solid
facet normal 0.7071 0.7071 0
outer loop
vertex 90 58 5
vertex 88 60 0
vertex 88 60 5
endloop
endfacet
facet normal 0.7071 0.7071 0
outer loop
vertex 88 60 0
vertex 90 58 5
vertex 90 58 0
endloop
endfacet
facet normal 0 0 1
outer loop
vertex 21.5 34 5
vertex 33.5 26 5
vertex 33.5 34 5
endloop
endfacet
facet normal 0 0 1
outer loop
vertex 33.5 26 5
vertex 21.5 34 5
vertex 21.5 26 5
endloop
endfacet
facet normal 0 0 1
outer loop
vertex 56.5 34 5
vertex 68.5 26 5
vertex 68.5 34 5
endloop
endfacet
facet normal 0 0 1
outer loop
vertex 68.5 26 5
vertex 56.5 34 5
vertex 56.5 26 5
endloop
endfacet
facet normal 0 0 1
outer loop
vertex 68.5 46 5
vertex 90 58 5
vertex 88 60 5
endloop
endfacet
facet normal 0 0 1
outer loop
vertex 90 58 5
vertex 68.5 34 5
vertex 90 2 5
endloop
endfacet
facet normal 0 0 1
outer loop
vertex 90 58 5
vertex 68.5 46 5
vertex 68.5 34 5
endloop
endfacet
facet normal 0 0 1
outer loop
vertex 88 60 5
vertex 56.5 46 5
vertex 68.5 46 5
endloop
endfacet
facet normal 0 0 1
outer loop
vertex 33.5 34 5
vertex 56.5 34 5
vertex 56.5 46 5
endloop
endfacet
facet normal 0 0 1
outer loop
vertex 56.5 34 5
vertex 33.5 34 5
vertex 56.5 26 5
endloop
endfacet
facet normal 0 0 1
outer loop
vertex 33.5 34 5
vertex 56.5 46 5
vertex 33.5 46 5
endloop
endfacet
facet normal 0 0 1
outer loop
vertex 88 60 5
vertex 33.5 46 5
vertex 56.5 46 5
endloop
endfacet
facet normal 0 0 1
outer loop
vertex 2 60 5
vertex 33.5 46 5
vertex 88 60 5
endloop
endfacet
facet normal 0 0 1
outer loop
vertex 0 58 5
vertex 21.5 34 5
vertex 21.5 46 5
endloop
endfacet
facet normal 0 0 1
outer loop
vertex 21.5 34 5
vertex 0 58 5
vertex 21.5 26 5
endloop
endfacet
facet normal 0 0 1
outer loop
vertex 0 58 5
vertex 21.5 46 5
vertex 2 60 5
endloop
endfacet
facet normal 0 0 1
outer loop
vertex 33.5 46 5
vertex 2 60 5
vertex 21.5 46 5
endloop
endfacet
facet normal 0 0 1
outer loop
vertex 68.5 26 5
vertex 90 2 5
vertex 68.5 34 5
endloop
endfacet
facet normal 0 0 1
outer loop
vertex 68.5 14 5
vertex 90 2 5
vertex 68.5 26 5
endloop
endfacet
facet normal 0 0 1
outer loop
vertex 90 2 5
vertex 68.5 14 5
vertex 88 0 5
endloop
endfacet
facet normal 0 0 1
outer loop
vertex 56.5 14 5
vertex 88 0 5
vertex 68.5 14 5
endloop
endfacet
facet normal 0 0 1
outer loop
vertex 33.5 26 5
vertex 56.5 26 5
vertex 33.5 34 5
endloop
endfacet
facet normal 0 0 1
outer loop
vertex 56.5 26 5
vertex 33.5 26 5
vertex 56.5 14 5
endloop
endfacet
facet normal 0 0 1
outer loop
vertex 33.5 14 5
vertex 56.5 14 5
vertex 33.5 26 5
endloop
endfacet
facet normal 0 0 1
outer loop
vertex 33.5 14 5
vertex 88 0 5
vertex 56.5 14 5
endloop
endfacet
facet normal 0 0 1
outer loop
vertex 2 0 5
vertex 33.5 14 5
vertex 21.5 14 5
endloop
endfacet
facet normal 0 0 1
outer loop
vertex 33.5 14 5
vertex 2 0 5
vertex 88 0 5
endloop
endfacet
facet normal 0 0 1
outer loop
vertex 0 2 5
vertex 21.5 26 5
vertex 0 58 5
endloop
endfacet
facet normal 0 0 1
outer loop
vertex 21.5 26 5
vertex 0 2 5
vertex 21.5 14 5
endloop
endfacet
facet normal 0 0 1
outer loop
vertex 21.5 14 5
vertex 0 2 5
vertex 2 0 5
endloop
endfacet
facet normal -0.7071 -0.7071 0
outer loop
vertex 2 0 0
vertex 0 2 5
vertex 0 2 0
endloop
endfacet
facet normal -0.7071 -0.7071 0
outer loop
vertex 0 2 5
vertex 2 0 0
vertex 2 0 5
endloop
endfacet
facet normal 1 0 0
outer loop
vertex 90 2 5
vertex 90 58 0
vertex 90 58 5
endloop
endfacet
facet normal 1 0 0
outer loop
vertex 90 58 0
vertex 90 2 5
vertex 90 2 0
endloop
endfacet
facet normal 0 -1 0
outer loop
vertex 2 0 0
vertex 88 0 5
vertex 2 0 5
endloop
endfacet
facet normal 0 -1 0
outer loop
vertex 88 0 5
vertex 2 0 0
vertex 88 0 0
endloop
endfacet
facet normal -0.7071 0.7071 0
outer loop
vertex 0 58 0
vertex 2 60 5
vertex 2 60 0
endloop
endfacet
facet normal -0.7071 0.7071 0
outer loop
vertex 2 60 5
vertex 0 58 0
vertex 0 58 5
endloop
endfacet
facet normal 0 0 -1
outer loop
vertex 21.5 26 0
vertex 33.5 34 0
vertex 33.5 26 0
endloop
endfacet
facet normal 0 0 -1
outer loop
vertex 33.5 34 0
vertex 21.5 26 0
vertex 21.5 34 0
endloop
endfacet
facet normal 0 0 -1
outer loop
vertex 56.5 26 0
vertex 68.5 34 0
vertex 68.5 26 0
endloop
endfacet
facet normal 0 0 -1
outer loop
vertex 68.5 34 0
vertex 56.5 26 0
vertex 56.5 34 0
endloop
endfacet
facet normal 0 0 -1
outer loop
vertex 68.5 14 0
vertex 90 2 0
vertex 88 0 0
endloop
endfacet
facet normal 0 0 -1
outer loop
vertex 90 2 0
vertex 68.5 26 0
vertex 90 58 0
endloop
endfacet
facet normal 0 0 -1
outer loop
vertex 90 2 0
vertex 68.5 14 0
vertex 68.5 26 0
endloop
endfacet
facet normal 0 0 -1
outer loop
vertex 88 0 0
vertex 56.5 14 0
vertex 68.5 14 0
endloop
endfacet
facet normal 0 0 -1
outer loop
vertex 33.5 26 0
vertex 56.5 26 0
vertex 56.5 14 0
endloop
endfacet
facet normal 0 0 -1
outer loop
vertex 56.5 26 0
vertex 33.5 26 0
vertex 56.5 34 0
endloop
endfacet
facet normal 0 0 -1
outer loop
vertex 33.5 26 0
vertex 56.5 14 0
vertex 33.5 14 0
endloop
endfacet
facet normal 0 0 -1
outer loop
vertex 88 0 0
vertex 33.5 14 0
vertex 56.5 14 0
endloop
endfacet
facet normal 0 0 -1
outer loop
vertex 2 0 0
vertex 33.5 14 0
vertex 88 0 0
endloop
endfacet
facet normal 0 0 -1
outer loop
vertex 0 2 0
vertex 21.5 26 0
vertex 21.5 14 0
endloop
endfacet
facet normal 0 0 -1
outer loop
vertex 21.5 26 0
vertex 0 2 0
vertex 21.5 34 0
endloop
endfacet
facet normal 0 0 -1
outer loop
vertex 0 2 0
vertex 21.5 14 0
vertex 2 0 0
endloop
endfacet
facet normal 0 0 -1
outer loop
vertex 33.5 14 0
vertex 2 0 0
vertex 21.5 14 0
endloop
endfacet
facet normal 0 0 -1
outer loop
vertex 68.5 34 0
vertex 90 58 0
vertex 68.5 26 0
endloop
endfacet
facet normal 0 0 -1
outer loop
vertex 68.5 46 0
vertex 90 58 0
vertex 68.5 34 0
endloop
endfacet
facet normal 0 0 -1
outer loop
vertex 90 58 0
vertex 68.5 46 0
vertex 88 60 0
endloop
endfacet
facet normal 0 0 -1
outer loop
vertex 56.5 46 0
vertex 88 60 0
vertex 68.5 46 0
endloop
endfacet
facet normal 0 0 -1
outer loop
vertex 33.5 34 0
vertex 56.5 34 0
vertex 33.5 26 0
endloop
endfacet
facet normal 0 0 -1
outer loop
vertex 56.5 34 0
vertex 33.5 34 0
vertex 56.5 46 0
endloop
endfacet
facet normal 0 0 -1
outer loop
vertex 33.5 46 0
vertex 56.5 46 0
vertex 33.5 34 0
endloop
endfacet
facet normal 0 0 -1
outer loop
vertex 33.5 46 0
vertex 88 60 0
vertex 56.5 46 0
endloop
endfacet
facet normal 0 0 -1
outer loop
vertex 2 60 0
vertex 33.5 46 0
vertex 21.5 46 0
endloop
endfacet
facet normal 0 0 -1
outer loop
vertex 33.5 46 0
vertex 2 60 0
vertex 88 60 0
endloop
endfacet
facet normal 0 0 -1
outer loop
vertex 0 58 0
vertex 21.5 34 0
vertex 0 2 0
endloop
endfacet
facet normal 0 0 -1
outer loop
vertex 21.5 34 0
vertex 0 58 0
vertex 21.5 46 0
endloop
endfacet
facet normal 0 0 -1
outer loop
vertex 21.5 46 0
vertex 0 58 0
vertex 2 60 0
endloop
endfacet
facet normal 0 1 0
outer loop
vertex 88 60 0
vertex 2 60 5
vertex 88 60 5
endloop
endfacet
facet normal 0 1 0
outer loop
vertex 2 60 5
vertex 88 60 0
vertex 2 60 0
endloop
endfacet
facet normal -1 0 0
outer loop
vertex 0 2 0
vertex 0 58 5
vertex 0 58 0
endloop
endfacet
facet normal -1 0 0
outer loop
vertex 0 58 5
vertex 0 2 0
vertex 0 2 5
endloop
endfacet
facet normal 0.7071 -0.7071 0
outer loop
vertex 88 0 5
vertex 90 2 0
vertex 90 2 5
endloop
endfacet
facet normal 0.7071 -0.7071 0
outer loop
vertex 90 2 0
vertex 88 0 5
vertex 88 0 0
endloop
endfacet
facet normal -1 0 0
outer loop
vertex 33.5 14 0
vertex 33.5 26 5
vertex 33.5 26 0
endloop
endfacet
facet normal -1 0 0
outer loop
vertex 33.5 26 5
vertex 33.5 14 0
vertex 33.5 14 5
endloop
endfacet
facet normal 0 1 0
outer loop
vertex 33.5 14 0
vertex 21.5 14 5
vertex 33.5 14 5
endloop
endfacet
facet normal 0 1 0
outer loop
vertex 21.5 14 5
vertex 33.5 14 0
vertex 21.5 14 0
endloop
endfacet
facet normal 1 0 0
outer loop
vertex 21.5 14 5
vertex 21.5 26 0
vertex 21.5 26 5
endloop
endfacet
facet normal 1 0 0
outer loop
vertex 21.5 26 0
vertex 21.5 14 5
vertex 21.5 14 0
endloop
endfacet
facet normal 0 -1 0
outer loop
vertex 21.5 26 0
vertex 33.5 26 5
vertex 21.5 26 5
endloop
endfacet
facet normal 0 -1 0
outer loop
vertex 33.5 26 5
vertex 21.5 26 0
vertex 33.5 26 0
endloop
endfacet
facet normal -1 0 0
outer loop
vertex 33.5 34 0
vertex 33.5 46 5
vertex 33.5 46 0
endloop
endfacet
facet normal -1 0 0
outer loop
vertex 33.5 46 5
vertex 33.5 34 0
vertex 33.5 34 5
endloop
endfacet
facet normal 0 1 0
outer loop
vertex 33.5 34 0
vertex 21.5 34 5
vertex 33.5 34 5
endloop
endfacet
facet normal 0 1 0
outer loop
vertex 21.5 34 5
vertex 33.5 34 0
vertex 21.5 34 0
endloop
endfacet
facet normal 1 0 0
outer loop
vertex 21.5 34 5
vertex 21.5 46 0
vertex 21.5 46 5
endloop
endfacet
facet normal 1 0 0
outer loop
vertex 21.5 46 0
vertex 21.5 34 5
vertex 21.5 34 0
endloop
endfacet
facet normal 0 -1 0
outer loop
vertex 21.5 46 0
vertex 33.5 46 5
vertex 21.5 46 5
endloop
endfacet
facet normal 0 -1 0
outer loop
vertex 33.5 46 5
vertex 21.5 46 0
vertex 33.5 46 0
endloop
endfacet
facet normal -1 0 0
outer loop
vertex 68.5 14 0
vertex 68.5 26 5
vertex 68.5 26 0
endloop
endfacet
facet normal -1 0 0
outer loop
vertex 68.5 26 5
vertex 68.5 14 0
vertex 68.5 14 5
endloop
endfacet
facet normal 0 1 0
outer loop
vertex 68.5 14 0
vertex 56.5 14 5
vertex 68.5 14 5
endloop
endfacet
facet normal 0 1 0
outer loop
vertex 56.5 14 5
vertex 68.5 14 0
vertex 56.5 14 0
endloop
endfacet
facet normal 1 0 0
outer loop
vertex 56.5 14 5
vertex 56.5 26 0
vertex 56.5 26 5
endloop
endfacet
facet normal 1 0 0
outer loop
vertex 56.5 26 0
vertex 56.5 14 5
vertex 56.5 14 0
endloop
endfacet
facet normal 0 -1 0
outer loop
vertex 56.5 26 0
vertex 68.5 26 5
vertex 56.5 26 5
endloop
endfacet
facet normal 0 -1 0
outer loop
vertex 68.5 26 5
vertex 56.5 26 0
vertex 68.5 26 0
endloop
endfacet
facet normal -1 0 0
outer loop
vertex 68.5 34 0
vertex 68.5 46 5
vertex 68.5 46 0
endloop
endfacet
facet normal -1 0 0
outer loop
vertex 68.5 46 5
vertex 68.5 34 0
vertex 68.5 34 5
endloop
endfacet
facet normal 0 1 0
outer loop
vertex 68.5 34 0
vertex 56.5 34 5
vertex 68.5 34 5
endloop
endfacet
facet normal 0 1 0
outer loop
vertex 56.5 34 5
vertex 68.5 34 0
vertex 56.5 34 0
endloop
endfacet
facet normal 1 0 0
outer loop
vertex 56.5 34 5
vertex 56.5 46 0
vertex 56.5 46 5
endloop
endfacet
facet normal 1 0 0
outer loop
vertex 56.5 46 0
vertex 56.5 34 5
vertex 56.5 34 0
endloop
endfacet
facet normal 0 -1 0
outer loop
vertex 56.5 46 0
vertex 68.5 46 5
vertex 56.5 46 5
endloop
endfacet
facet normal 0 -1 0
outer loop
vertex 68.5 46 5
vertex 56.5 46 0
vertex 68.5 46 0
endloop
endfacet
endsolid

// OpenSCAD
$fn = 32;

// ----------------------------------------------------------------------
// Windowed plate: 4 voids, 90 x 60 x 5 mm
// ----------------------------------------------------------------------

// --- parameters (mm) ---
plate_l = 90;             // plate length, X
plate_w = 60;             // plate width, Y
plate_t = 5;              // plate thickness, Z
edge_margin = 10;         // wall from the plate edge to any window
win_l = 12;               // pocket length
win_w = 12;               // pocket width
pitch_x = 35;             // grid pitch along X
pitch_y = 20;             // grid pitch along Y
depth_1 = 5;              // depth of void 1 (full thickness = through)
depth_2 = 5;              // depth of void 2 (full thickness = through)
depth_3 = 5;              // depth of void 3 (full thickness = through)
depth_4 = 5;              // depth of void 4 (full thickness = through)
corner_c = 2;             // corner chamfer of the plate

profile = [[2, 0], [88, 0], [90, 2], [90, 58], [88, 60], [2, 60], [0, 58], [0, 2]];  // primary outline, 8 points, counter clockwise
void_1 = [[21.5, 14], [33.5, 14], [33.5, 26], [21.5, 26]];  // pocket at grid node 0,0, 4 points
void_2 = [[21.5, 34], [33.5, 34], [33.5, 46], [21.5, 46]];  // pocket at grid node 0,1, 4 points
void_3 = [[56.5, 14], [68.5, 14], [68.5, 26], [56.5, 26]];  // pocket at grid node 1,0, 4 points
void_4 = [[56.5, 34], [68.5, 34], [68.5, 46], [56.5, 46]];  // pocket at grid node 1,1, 4 points

// --- the one profile operation ---
difference() {
  linear_extrude(height = plate_t) polygon(points = profile);
  translate([0, 0, -1])
    linear_extrude(height = plate_t + 2) polygon(points = void_1);
  translate([0, 0, -1])
    linear_extrude(height = plate_t + 2) polygon(points = void_2);
  translate([0, 0, -1])
    linear_extrude(height = plate_t + 2) polygon(points = void_3);
  translate([0, 0, -1])
    linear_extrude(height = plate_t + 2) polygon(points = void_4);
}
